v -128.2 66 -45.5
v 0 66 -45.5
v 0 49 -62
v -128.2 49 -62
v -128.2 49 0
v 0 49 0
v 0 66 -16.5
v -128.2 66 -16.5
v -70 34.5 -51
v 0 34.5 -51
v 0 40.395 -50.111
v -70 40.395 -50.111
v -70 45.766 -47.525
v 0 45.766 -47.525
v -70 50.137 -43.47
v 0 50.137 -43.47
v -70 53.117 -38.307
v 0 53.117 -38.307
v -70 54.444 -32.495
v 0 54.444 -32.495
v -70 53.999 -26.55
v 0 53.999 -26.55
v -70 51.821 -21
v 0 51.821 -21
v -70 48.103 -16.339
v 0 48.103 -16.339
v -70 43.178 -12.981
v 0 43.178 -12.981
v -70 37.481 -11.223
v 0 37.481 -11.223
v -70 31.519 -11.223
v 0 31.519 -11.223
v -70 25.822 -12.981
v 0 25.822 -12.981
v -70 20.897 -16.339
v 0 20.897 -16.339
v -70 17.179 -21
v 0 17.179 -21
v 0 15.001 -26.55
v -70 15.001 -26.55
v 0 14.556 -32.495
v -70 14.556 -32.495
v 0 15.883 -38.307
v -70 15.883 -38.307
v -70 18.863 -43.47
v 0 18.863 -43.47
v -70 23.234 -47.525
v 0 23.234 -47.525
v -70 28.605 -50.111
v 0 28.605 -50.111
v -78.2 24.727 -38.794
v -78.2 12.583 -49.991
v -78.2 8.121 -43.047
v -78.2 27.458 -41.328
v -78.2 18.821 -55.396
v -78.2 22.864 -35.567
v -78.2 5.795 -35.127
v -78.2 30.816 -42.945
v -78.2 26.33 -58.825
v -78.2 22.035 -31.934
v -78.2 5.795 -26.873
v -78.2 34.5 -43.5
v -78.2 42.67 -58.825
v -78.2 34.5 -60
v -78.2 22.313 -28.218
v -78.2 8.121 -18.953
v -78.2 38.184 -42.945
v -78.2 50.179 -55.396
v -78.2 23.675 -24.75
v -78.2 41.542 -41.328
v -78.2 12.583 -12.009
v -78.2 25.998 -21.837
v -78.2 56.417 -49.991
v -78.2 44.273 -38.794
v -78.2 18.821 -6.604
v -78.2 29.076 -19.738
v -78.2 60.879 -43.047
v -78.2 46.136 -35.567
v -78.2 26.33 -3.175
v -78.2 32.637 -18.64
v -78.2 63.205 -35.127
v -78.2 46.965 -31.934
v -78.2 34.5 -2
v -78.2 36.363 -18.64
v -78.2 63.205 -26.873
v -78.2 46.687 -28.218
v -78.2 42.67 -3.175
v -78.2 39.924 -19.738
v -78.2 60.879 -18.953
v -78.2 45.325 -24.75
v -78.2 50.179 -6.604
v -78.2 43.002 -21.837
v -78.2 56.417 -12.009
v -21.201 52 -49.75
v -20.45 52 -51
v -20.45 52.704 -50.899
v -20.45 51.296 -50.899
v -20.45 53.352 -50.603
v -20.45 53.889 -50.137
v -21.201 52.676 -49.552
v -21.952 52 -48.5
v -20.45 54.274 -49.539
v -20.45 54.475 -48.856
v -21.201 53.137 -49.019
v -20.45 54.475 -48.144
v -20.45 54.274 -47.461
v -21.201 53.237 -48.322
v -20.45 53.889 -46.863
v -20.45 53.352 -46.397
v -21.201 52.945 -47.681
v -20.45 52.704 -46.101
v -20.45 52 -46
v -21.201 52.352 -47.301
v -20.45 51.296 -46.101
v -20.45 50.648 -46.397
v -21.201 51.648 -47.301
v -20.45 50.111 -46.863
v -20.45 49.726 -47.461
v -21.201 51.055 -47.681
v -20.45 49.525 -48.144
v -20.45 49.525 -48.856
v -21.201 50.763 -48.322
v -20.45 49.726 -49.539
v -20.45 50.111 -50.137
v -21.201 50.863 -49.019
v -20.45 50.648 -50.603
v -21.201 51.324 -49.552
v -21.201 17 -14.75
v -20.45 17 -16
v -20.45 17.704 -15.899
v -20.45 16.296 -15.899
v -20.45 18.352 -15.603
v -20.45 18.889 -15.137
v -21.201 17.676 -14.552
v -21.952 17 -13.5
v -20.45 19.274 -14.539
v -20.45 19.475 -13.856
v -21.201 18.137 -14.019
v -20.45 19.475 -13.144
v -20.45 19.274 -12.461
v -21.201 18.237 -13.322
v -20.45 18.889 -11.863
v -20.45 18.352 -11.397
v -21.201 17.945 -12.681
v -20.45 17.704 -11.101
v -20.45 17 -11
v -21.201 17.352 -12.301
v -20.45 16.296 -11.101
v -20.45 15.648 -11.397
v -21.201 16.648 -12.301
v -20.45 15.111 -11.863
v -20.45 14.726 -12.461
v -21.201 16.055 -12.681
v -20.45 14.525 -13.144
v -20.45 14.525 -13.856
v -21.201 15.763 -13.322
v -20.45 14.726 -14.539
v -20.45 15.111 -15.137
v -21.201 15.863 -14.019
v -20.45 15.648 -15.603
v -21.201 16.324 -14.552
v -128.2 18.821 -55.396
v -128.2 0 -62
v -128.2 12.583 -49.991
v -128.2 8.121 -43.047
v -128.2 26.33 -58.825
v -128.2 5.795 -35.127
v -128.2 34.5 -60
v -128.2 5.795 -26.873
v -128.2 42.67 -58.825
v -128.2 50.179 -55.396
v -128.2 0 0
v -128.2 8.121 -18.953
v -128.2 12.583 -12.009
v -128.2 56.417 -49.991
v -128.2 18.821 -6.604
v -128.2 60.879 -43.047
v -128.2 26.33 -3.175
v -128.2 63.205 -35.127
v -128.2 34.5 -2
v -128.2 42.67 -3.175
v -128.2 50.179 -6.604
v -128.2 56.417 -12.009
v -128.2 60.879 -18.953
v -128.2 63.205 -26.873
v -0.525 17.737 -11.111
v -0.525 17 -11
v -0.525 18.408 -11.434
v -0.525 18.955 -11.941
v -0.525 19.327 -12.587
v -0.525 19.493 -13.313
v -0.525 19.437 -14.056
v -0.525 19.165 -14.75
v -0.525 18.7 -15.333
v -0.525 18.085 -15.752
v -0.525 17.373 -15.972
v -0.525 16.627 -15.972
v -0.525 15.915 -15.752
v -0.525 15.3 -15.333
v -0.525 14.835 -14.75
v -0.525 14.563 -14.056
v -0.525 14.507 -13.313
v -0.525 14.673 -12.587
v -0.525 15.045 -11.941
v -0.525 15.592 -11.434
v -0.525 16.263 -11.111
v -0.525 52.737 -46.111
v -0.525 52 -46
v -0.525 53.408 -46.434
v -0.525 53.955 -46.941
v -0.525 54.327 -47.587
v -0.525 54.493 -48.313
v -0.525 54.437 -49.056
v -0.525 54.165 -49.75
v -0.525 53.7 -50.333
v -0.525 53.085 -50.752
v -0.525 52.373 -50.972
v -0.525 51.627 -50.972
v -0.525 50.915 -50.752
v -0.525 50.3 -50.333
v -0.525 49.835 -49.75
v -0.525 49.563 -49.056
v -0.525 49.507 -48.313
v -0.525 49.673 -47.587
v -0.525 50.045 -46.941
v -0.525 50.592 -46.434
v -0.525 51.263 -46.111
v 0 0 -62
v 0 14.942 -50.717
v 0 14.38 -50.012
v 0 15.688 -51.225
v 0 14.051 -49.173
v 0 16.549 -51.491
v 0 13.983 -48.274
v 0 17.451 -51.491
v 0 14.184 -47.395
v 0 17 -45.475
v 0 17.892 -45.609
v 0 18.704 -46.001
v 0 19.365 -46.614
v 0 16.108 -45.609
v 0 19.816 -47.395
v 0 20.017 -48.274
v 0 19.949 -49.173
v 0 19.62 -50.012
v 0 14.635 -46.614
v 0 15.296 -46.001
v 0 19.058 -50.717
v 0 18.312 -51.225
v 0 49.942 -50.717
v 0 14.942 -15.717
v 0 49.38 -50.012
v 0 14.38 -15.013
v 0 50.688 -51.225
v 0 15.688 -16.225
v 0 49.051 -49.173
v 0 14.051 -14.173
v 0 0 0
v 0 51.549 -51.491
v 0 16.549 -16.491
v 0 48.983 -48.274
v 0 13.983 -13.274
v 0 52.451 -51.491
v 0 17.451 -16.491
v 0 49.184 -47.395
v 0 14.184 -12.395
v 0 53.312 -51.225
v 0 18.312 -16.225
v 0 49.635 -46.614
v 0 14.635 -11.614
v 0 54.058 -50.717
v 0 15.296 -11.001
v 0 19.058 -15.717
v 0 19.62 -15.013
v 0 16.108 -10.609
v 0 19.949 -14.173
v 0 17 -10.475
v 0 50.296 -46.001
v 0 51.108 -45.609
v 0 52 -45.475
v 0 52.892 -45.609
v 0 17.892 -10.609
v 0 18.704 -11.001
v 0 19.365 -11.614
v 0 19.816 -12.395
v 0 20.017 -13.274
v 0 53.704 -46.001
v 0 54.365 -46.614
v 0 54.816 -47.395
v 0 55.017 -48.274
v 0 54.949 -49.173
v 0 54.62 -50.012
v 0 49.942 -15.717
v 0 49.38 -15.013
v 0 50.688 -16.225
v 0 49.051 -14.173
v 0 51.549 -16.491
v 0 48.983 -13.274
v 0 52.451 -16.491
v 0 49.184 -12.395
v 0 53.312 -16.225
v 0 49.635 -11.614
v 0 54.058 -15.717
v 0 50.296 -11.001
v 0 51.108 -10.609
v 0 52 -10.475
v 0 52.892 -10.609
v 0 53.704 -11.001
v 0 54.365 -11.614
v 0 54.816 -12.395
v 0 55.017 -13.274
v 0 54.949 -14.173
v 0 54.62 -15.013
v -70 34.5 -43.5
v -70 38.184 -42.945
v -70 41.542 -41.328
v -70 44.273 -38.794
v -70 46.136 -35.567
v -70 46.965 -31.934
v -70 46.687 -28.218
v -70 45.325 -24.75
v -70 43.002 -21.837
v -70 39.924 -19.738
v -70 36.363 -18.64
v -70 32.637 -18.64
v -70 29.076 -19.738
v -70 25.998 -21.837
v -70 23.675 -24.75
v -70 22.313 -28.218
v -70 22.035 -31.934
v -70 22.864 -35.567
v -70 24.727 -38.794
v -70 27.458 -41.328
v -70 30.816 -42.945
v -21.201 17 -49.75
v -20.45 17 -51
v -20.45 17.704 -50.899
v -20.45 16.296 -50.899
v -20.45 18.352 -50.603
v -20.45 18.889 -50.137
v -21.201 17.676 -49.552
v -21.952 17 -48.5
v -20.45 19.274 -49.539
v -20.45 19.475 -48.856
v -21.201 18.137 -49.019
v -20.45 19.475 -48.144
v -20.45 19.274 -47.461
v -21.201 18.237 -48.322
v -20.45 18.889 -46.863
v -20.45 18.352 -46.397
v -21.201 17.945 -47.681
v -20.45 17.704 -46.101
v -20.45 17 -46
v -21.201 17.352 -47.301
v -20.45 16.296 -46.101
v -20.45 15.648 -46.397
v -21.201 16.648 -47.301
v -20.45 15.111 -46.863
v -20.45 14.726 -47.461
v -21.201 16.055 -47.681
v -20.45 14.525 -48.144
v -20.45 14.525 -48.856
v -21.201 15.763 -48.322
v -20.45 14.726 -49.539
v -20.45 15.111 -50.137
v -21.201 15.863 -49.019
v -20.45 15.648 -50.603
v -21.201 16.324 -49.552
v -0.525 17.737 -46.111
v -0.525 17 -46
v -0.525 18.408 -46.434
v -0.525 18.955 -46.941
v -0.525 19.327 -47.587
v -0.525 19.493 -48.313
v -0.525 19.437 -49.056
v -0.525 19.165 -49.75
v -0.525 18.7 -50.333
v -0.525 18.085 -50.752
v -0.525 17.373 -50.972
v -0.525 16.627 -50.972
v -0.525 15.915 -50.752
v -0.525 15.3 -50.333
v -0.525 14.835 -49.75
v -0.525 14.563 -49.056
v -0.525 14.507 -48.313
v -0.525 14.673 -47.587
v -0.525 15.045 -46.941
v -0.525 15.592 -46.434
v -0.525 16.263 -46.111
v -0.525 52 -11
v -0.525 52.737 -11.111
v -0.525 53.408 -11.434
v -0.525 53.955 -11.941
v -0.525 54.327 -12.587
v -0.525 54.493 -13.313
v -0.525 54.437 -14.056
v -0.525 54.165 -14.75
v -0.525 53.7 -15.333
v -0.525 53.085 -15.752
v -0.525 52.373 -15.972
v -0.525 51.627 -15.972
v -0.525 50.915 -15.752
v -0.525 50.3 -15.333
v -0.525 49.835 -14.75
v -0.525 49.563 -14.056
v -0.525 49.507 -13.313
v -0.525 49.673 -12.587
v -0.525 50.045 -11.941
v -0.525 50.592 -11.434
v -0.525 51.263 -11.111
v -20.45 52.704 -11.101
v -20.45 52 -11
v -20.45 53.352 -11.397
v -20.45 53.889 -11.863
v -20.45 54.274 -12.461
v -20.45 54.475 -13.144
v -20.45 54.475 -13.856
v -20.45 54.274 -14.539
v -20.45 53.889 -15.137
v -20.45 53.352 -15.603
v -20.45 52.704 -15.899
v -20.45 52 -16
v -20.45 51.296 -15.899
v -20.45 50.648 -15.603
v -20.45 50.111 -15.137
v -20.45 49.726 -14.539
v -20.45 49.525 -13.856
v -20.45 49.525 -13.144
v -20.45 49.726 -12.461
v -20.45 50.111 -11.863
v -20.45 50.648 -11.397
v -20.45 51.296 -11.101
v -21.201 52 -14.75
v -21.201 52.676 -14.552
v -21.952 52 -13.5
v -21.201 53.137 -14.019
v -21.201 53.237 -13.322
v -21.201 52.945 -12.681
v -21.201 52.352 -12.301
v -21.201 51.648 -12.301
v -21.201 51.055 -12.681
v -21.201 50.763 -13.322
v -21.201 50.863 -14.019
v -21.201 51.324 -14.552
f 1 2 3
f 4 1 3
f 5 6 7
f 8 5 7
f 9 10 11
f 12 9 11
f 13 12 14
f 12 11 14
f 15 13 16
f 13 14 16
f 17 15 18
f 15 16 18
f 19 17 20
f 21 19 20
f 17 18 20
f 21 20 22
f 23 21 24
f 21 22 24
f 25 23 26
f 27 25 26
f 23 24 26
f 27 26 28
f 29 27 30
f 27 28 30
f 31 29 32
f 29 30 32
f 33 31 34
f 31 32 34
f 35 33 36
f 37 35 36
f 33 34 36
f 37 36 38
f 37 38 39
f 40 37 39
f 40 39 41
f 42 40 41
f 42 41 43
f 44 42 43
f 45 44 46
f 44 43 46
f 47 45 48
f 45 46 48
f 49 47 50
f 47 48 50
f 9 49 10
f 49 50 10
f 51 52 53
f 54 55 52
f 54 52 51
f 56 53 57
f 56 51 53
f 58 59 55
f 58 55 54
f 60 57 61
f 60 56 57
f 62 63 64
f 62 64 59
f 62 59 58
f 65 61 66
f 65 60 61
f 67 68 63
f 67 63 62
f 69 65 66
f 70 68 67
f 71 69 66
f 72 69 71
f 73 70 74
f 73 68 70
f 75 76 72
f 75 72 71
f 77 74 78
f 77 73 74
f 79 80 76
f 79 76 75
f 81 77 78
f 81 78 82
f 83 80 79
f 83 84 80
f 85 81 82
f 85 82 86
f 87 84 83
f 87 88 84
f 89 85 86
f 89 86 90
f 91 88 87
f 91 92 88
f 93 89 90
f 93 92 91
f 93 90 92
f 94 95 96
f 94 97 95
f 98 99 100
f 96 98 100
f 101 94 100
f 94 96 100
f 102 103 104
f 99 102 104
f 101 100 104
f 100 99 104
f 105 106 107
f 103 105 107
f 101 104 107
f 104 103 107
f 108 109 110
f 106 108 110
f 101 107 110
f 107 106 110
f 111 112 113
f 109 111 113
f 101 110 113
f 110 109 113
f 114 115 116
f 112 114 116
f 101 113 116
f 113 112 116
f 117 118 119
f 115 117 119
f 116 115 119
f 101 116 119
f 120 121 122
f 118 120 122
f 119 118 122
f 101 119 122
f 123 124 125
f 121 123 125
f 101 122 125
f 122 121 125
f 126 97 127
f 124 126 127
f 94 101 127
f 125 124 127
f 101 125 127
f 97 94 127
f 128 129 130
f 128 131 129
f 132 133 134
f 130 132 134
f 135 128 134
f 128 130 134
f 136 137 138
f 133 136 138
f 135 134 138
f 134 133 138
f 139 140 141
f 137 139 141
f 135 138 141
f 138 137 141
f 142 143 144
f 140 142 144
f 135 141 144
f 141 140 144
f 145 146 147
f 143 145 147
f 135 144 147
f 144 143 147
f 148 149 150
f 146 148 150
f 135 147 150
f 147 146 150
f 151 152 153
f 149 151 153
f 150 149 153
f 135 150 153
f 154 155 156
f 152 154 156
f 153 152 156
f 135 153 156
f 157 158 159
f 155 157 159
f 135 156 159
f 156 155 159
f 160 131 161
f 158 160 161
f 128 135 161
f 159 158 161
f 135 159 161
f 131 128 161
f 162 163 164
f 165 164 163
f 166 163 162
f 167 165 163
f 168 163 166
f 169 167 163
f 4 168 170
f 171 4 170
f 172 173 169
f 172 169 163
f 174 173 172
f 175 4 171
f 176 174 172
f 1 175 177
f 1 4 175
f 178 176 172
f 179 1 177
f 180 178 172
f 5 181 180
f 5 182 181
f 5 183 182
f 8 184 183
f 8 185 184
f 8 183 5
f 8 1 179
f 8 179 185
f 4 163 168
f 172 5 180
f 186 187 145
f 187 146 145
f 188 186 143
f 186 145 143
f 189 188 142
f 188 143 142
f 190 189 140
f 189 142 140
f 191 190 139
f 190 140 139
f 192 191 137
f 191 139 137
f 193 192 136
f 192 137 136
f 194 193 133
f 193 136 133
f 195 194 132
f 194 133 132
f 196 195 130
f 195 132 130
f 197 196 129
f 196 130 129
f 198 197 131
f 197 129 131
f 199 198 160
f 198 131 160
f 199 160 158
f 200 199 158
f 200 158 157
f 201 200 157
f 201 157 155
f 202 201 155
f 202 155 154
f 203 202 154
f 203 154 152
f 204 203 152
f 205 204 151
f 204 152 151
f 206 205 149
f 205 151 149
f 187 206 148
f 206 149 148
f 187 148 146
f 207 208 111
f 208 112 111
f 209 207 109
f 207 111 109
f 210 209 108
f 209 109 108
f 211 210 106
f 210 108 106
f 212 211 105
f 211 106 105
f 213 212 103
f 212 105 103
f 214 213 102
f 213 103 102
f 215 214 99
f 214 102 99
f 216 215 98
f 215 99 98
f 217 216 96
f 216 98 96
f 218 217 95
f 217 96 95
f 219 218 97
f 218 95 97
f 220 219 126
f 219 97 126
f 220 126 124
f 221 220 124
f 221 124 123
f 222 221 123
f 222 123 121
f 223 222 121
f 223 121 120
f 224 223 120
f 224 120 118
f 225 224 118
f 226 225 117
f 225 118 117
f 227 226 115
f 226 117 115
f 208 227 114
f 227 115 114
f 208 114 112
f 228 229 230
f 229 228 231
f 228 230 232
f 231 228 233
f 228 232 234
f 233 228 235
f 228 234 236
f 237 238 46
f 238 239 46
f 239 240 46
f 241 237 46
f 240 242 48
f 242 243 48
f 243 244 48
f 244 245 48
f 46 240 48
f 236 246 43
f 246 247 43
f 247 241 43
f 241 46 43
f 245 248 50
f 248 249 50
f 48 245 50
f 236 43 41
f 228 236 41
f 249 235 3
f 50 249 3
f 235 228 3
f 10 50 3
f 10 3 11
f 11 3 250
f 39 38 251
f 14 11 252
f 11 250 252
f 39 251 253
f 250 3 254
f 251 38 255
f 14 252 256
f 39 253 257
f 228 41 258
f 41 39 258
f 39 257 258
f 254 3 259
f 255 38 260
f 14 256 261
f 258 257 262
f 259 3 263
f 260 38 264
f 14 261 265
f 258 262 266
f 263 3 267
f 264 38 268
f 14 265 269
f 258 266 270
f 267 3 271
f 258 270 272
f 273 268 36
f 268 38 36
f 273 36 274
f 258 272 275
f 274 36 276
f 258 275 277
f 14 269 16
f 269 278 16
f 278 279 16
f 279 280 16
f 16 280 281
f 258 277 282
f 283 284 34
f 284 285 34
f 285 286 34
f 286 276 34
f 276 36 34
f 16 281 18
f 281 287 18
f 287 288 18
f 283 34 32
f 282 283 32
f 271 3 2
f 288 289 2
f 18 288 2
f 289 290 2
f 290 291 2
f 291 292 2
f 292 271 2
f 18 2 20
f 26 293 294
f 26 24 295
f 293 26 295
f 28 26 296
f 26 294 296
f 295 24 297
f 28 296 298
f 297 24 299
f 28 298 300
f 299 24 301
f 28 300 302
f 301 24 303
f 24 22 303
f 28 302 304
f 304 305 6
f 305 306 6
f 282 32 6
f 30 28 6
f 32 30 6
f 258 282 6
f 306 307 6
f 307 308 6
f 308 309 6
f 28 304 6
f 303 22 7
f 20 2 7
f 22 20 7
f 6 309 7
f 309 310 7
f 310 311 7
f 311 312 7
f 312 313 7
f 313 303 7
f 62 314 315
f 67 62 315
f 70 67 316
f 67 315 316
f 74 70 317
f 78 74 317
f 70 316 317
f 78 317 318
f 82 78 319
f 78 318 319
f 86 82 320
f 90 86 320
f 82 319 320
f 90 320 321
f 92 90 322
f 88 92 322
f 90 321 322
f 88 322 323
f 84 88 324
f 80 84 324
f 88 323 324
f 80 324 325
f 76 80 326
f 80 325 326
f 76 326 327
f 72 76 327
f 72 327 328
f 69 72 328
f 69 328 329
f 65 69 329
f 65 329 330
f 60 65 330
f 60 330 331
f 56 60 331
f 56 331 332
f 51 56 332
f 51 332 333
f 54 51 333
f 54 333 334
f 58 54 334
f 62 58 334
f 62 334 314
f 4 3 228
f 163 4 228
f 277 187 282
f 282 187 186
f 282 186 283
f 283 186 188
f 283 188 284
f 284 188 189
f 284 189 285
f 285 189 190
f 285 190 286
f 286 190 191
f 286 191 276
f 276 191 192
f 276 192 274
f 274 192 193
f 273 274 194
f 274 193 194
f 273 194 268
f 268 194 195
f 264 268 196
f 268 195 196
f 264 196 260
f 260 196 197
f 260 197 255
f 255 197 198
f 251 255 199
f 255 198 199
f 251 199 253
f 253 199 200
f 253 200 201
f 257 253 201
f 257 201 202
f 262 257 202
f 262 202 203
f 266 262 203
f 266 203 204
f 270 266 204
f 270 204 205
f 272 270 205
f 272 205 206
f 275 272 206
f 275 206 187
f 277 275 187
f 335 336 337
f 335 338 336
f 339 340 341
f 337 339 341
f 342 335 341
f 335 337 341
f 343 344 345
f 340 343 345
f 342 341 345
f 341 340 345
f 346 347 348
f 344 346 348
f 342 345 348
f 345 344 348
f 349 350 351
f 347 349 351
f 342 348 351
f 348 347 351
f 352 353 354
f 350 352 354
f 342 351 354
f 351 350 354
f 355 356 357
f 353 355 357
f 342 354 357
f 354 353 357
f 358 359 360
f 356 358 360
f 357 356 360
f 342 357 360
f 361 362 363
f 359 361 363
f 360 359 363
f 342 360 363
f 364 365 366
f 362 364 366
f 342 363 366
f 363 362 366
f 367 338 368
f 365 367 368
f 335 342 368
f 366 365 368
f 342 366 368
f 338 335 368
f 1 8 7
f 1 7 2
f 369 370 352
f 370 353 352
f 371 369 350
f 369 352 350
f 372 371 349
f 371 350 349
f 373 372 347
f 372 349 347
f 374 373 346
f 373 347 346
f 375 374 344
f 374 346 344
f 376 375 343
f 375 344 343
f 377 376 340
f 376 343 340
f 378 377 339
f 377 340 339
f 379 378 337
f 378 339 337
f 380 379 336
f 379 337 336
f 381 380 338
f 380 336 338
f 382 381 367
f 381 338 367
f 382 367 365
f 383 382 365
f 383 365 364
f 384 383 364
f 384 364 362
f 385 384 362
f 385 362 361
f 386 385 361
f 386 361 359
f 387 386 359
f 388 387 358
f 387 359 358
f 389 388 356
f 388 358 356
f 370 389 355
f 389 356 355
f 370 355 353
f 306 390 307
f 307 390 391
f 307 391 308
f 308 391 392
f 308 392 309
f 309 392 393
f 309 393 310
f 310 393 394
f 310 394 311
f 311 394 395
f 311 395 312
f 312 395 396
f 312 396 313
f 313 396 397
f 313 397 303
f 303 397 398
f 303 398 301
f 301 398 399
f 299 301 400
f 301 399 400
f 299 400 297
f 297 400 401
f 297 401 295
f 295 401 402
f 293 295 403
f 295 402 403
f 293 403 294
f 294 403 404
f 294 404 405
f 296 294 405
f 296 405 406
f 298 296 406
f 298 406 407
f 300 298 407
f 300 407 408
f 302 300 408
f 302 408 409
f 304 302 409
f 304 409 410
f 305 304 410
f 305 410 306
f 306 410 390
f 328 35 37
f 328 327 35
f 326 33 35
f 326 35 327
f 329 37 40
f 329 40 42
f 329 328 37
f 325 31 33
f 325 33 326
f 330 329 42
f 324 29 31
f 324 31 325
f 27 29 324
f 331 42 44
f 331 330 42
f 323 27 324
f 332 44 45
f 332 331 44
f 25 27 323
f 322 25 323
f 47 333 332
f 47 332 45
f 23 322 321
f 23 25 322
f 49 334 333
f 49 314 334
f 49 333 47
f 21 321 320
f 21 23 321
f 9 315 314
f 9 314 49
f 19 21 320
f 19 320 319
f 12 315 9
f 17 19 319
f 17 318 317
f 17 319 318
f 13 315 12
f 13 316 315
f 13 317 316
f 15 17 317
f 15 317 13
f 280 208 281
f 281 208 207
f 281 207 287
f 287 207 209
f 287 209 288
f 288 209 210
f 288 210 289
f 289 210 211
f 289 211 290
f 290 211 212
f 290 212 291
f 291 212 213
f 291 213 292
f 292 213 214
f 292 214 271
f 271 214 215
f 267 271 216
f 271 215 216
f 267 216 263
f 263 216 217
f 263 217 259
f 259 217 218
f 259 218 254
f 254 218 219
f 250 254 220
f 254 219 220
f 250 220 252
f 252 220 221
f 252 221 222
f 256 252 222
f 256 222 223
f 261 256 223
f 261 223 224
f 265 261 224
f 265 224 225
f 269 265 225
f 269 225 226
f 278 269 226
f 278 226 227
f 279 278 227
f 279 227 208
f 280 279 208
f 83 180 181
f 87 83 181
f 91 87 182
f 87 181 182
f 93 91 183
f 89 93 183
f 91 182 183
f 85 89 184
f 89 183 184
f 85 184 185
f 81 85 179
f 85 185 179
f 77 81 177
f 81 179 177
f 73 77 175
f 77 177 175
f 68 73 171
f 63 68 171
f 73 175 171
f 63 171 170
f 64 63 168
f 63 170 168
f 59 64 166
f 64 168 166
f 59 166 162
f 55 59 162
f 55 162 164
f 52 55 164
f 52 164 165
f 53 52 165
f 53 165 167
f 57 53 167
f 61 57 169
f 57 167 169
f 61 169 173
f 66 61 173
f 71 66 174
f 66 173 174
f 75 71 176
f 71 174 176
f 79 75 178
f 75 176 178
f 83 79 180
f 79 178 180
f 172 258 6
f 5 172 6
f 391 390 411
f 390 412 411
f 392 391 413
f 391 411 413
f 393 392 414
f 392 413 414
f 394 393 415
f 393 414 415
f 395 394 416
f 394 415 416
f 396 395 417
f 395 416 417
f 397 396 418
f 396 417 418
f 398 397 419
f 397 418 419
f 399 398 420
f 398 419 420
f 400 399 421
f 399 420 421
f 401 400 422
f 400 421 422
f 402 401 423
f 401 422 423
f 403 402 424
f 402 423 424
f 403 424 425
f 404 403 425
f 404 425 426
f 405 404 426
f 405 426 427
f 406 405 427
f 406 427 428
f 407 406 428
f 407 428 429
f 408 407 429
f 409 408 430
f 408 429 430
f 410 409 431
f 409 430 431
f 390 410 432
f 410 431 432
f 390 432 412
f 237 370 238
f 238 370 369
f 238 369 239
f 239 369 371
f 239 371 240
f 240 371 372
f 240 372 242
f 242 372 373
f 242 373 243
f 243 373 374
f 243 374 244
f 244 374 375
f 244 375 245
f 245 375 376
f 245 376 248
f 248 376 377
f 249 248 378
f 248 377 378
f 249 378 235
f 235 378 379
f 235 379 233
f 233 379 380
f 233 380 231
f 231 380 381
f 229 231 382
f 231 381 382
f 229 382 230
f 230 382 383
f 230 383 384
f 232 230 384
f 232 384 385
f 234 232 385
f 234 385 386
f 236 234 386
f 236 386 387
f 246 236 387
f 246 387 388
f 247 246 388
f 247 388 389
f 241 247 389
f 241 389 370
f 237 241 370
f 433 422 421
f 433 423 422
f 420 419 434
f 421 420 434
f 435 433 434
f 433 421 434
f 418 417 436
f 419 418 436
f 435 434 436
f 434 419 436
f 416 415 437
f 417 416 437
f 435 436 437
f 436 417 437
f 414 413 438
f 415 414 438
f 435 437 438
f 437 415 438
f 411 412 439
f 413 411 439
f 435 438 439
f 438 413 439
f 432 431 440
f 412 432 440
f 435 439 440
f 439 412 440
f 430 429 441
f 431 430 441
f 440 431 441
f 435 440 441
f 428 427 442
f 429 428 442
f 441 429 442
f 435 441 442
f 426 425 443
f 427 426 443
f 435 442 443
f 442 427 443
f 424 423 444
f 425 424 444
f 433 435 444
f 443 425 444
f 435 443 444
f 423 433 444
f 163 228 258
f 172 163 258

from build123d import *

# Parameters (mm, degrees)
RESSALTO_EXTRUS_O1_DEPTH        = 128.2
FURO_ROSCADO_DE_M61_D           = 5
FURO_ROSCADO_DE_M61_DEPTH       = 20.45
FURO_ROSCADO_DE_M61_CSINK_D     = 6.05
FURO_ROSCADO_DE_M61_CSINK_ANGLE = 90
FURO_ROSCADO_DE_M61_TIP         = 1.502151548
ESBO_O4_R                       = 12.5
CORTE_EXTRUS_O1_DEPTH           = 157.956172227
ESBO_O5_R                       = 29
CORTE_EXTRUS_O2_DEPTH           = 50
ESBO_O6_R                       = 20
CORTE_EXTRUS_O3_DEPTH           = 70


with BuildPart() as part:
    # Esboço1 → Ressalto-extrusão1 (new body)
    with BuildSketch(Plane(origin=(0, 0, 0), x_dir=(0, 0, -1), z_dir=(1, 0, 0))):
        Polygon((0, 49), (16.5, 66), (45.5, 66), (62, 49), (62, 0), (0, 0), align=None)
    extrude(amount=-RESSALTO_EXTRUS_O1_DEPTH)

    # Furo roscado de M61
    with Locations(Plane(origin=(0, 0, 0), x_dir=(0, 0, -1), z_dir=(1, 0, 0))):
        with Locations((13.5, 52), (48.5, 52), (48.5, 17), (13.5, 17)):
            CounterSinkHole(FURO_ROSCADO_DE_M61_D / 2, FURO_ROSCADO_DE_M61_CSINK_D / 2, depth=FURO_ROSCADO_DE_M61_DEPTH, counter_sink_angle=FURO_ROSCADO_DE_M61_CSINK_ANGLE)
            with Locations((0, 0, -(FURO_ROSCADO_DE_M61_DEPTH + FURO_ROSCADO_DE_M61_TIP / 2))):  # 118° drill point
                Cone(0, FURO_ROSCADO_DE_M61_D / 2, FURO_ROSCADO_DE_M61_TIP, mode=Mode.SUBTRACT)

    # Esboço4 → Corte-extrusão1 (cut, through all)
    with BuildSketch(Plane(origin=(0, 0, 0), x_dir=(0, 0, -1), z_dir=(1, 0, 0))):
        with Locations((31, 34.5)):
            Circle(ESBO_O4_R)
    extrude(amount=-CORTE_EXTRUS_O1_DEPTH, mode=Mode.SUBTRACT)

    # Esboço5 → Corte-extrusão2 (cut)
    with BuildSketch(Plane.ZY.offset(128.2)):
        with Locations((-31, 34.5)):
            Circle(ESBO_O5_R)
    extrude(amount=-CORTE_EXTRUS_O2_DEPTH, mode=Mode.SUBTRACT)

    # Esboço6 → Corte-extrusão3 (cut)
    with BuildSketch(Plane(origin=(0, 0, 0), x_dir=(0, 0, -1), z_dir=(1, 0, 0))):
        with Locations((31, 34.5)):
            Circle(ESBO_O6_R)
    extrude(amount=-CORTE_EXTRUS_O3_DEPTH, mode=Mode.SUBTRACT)


solid = part.part
